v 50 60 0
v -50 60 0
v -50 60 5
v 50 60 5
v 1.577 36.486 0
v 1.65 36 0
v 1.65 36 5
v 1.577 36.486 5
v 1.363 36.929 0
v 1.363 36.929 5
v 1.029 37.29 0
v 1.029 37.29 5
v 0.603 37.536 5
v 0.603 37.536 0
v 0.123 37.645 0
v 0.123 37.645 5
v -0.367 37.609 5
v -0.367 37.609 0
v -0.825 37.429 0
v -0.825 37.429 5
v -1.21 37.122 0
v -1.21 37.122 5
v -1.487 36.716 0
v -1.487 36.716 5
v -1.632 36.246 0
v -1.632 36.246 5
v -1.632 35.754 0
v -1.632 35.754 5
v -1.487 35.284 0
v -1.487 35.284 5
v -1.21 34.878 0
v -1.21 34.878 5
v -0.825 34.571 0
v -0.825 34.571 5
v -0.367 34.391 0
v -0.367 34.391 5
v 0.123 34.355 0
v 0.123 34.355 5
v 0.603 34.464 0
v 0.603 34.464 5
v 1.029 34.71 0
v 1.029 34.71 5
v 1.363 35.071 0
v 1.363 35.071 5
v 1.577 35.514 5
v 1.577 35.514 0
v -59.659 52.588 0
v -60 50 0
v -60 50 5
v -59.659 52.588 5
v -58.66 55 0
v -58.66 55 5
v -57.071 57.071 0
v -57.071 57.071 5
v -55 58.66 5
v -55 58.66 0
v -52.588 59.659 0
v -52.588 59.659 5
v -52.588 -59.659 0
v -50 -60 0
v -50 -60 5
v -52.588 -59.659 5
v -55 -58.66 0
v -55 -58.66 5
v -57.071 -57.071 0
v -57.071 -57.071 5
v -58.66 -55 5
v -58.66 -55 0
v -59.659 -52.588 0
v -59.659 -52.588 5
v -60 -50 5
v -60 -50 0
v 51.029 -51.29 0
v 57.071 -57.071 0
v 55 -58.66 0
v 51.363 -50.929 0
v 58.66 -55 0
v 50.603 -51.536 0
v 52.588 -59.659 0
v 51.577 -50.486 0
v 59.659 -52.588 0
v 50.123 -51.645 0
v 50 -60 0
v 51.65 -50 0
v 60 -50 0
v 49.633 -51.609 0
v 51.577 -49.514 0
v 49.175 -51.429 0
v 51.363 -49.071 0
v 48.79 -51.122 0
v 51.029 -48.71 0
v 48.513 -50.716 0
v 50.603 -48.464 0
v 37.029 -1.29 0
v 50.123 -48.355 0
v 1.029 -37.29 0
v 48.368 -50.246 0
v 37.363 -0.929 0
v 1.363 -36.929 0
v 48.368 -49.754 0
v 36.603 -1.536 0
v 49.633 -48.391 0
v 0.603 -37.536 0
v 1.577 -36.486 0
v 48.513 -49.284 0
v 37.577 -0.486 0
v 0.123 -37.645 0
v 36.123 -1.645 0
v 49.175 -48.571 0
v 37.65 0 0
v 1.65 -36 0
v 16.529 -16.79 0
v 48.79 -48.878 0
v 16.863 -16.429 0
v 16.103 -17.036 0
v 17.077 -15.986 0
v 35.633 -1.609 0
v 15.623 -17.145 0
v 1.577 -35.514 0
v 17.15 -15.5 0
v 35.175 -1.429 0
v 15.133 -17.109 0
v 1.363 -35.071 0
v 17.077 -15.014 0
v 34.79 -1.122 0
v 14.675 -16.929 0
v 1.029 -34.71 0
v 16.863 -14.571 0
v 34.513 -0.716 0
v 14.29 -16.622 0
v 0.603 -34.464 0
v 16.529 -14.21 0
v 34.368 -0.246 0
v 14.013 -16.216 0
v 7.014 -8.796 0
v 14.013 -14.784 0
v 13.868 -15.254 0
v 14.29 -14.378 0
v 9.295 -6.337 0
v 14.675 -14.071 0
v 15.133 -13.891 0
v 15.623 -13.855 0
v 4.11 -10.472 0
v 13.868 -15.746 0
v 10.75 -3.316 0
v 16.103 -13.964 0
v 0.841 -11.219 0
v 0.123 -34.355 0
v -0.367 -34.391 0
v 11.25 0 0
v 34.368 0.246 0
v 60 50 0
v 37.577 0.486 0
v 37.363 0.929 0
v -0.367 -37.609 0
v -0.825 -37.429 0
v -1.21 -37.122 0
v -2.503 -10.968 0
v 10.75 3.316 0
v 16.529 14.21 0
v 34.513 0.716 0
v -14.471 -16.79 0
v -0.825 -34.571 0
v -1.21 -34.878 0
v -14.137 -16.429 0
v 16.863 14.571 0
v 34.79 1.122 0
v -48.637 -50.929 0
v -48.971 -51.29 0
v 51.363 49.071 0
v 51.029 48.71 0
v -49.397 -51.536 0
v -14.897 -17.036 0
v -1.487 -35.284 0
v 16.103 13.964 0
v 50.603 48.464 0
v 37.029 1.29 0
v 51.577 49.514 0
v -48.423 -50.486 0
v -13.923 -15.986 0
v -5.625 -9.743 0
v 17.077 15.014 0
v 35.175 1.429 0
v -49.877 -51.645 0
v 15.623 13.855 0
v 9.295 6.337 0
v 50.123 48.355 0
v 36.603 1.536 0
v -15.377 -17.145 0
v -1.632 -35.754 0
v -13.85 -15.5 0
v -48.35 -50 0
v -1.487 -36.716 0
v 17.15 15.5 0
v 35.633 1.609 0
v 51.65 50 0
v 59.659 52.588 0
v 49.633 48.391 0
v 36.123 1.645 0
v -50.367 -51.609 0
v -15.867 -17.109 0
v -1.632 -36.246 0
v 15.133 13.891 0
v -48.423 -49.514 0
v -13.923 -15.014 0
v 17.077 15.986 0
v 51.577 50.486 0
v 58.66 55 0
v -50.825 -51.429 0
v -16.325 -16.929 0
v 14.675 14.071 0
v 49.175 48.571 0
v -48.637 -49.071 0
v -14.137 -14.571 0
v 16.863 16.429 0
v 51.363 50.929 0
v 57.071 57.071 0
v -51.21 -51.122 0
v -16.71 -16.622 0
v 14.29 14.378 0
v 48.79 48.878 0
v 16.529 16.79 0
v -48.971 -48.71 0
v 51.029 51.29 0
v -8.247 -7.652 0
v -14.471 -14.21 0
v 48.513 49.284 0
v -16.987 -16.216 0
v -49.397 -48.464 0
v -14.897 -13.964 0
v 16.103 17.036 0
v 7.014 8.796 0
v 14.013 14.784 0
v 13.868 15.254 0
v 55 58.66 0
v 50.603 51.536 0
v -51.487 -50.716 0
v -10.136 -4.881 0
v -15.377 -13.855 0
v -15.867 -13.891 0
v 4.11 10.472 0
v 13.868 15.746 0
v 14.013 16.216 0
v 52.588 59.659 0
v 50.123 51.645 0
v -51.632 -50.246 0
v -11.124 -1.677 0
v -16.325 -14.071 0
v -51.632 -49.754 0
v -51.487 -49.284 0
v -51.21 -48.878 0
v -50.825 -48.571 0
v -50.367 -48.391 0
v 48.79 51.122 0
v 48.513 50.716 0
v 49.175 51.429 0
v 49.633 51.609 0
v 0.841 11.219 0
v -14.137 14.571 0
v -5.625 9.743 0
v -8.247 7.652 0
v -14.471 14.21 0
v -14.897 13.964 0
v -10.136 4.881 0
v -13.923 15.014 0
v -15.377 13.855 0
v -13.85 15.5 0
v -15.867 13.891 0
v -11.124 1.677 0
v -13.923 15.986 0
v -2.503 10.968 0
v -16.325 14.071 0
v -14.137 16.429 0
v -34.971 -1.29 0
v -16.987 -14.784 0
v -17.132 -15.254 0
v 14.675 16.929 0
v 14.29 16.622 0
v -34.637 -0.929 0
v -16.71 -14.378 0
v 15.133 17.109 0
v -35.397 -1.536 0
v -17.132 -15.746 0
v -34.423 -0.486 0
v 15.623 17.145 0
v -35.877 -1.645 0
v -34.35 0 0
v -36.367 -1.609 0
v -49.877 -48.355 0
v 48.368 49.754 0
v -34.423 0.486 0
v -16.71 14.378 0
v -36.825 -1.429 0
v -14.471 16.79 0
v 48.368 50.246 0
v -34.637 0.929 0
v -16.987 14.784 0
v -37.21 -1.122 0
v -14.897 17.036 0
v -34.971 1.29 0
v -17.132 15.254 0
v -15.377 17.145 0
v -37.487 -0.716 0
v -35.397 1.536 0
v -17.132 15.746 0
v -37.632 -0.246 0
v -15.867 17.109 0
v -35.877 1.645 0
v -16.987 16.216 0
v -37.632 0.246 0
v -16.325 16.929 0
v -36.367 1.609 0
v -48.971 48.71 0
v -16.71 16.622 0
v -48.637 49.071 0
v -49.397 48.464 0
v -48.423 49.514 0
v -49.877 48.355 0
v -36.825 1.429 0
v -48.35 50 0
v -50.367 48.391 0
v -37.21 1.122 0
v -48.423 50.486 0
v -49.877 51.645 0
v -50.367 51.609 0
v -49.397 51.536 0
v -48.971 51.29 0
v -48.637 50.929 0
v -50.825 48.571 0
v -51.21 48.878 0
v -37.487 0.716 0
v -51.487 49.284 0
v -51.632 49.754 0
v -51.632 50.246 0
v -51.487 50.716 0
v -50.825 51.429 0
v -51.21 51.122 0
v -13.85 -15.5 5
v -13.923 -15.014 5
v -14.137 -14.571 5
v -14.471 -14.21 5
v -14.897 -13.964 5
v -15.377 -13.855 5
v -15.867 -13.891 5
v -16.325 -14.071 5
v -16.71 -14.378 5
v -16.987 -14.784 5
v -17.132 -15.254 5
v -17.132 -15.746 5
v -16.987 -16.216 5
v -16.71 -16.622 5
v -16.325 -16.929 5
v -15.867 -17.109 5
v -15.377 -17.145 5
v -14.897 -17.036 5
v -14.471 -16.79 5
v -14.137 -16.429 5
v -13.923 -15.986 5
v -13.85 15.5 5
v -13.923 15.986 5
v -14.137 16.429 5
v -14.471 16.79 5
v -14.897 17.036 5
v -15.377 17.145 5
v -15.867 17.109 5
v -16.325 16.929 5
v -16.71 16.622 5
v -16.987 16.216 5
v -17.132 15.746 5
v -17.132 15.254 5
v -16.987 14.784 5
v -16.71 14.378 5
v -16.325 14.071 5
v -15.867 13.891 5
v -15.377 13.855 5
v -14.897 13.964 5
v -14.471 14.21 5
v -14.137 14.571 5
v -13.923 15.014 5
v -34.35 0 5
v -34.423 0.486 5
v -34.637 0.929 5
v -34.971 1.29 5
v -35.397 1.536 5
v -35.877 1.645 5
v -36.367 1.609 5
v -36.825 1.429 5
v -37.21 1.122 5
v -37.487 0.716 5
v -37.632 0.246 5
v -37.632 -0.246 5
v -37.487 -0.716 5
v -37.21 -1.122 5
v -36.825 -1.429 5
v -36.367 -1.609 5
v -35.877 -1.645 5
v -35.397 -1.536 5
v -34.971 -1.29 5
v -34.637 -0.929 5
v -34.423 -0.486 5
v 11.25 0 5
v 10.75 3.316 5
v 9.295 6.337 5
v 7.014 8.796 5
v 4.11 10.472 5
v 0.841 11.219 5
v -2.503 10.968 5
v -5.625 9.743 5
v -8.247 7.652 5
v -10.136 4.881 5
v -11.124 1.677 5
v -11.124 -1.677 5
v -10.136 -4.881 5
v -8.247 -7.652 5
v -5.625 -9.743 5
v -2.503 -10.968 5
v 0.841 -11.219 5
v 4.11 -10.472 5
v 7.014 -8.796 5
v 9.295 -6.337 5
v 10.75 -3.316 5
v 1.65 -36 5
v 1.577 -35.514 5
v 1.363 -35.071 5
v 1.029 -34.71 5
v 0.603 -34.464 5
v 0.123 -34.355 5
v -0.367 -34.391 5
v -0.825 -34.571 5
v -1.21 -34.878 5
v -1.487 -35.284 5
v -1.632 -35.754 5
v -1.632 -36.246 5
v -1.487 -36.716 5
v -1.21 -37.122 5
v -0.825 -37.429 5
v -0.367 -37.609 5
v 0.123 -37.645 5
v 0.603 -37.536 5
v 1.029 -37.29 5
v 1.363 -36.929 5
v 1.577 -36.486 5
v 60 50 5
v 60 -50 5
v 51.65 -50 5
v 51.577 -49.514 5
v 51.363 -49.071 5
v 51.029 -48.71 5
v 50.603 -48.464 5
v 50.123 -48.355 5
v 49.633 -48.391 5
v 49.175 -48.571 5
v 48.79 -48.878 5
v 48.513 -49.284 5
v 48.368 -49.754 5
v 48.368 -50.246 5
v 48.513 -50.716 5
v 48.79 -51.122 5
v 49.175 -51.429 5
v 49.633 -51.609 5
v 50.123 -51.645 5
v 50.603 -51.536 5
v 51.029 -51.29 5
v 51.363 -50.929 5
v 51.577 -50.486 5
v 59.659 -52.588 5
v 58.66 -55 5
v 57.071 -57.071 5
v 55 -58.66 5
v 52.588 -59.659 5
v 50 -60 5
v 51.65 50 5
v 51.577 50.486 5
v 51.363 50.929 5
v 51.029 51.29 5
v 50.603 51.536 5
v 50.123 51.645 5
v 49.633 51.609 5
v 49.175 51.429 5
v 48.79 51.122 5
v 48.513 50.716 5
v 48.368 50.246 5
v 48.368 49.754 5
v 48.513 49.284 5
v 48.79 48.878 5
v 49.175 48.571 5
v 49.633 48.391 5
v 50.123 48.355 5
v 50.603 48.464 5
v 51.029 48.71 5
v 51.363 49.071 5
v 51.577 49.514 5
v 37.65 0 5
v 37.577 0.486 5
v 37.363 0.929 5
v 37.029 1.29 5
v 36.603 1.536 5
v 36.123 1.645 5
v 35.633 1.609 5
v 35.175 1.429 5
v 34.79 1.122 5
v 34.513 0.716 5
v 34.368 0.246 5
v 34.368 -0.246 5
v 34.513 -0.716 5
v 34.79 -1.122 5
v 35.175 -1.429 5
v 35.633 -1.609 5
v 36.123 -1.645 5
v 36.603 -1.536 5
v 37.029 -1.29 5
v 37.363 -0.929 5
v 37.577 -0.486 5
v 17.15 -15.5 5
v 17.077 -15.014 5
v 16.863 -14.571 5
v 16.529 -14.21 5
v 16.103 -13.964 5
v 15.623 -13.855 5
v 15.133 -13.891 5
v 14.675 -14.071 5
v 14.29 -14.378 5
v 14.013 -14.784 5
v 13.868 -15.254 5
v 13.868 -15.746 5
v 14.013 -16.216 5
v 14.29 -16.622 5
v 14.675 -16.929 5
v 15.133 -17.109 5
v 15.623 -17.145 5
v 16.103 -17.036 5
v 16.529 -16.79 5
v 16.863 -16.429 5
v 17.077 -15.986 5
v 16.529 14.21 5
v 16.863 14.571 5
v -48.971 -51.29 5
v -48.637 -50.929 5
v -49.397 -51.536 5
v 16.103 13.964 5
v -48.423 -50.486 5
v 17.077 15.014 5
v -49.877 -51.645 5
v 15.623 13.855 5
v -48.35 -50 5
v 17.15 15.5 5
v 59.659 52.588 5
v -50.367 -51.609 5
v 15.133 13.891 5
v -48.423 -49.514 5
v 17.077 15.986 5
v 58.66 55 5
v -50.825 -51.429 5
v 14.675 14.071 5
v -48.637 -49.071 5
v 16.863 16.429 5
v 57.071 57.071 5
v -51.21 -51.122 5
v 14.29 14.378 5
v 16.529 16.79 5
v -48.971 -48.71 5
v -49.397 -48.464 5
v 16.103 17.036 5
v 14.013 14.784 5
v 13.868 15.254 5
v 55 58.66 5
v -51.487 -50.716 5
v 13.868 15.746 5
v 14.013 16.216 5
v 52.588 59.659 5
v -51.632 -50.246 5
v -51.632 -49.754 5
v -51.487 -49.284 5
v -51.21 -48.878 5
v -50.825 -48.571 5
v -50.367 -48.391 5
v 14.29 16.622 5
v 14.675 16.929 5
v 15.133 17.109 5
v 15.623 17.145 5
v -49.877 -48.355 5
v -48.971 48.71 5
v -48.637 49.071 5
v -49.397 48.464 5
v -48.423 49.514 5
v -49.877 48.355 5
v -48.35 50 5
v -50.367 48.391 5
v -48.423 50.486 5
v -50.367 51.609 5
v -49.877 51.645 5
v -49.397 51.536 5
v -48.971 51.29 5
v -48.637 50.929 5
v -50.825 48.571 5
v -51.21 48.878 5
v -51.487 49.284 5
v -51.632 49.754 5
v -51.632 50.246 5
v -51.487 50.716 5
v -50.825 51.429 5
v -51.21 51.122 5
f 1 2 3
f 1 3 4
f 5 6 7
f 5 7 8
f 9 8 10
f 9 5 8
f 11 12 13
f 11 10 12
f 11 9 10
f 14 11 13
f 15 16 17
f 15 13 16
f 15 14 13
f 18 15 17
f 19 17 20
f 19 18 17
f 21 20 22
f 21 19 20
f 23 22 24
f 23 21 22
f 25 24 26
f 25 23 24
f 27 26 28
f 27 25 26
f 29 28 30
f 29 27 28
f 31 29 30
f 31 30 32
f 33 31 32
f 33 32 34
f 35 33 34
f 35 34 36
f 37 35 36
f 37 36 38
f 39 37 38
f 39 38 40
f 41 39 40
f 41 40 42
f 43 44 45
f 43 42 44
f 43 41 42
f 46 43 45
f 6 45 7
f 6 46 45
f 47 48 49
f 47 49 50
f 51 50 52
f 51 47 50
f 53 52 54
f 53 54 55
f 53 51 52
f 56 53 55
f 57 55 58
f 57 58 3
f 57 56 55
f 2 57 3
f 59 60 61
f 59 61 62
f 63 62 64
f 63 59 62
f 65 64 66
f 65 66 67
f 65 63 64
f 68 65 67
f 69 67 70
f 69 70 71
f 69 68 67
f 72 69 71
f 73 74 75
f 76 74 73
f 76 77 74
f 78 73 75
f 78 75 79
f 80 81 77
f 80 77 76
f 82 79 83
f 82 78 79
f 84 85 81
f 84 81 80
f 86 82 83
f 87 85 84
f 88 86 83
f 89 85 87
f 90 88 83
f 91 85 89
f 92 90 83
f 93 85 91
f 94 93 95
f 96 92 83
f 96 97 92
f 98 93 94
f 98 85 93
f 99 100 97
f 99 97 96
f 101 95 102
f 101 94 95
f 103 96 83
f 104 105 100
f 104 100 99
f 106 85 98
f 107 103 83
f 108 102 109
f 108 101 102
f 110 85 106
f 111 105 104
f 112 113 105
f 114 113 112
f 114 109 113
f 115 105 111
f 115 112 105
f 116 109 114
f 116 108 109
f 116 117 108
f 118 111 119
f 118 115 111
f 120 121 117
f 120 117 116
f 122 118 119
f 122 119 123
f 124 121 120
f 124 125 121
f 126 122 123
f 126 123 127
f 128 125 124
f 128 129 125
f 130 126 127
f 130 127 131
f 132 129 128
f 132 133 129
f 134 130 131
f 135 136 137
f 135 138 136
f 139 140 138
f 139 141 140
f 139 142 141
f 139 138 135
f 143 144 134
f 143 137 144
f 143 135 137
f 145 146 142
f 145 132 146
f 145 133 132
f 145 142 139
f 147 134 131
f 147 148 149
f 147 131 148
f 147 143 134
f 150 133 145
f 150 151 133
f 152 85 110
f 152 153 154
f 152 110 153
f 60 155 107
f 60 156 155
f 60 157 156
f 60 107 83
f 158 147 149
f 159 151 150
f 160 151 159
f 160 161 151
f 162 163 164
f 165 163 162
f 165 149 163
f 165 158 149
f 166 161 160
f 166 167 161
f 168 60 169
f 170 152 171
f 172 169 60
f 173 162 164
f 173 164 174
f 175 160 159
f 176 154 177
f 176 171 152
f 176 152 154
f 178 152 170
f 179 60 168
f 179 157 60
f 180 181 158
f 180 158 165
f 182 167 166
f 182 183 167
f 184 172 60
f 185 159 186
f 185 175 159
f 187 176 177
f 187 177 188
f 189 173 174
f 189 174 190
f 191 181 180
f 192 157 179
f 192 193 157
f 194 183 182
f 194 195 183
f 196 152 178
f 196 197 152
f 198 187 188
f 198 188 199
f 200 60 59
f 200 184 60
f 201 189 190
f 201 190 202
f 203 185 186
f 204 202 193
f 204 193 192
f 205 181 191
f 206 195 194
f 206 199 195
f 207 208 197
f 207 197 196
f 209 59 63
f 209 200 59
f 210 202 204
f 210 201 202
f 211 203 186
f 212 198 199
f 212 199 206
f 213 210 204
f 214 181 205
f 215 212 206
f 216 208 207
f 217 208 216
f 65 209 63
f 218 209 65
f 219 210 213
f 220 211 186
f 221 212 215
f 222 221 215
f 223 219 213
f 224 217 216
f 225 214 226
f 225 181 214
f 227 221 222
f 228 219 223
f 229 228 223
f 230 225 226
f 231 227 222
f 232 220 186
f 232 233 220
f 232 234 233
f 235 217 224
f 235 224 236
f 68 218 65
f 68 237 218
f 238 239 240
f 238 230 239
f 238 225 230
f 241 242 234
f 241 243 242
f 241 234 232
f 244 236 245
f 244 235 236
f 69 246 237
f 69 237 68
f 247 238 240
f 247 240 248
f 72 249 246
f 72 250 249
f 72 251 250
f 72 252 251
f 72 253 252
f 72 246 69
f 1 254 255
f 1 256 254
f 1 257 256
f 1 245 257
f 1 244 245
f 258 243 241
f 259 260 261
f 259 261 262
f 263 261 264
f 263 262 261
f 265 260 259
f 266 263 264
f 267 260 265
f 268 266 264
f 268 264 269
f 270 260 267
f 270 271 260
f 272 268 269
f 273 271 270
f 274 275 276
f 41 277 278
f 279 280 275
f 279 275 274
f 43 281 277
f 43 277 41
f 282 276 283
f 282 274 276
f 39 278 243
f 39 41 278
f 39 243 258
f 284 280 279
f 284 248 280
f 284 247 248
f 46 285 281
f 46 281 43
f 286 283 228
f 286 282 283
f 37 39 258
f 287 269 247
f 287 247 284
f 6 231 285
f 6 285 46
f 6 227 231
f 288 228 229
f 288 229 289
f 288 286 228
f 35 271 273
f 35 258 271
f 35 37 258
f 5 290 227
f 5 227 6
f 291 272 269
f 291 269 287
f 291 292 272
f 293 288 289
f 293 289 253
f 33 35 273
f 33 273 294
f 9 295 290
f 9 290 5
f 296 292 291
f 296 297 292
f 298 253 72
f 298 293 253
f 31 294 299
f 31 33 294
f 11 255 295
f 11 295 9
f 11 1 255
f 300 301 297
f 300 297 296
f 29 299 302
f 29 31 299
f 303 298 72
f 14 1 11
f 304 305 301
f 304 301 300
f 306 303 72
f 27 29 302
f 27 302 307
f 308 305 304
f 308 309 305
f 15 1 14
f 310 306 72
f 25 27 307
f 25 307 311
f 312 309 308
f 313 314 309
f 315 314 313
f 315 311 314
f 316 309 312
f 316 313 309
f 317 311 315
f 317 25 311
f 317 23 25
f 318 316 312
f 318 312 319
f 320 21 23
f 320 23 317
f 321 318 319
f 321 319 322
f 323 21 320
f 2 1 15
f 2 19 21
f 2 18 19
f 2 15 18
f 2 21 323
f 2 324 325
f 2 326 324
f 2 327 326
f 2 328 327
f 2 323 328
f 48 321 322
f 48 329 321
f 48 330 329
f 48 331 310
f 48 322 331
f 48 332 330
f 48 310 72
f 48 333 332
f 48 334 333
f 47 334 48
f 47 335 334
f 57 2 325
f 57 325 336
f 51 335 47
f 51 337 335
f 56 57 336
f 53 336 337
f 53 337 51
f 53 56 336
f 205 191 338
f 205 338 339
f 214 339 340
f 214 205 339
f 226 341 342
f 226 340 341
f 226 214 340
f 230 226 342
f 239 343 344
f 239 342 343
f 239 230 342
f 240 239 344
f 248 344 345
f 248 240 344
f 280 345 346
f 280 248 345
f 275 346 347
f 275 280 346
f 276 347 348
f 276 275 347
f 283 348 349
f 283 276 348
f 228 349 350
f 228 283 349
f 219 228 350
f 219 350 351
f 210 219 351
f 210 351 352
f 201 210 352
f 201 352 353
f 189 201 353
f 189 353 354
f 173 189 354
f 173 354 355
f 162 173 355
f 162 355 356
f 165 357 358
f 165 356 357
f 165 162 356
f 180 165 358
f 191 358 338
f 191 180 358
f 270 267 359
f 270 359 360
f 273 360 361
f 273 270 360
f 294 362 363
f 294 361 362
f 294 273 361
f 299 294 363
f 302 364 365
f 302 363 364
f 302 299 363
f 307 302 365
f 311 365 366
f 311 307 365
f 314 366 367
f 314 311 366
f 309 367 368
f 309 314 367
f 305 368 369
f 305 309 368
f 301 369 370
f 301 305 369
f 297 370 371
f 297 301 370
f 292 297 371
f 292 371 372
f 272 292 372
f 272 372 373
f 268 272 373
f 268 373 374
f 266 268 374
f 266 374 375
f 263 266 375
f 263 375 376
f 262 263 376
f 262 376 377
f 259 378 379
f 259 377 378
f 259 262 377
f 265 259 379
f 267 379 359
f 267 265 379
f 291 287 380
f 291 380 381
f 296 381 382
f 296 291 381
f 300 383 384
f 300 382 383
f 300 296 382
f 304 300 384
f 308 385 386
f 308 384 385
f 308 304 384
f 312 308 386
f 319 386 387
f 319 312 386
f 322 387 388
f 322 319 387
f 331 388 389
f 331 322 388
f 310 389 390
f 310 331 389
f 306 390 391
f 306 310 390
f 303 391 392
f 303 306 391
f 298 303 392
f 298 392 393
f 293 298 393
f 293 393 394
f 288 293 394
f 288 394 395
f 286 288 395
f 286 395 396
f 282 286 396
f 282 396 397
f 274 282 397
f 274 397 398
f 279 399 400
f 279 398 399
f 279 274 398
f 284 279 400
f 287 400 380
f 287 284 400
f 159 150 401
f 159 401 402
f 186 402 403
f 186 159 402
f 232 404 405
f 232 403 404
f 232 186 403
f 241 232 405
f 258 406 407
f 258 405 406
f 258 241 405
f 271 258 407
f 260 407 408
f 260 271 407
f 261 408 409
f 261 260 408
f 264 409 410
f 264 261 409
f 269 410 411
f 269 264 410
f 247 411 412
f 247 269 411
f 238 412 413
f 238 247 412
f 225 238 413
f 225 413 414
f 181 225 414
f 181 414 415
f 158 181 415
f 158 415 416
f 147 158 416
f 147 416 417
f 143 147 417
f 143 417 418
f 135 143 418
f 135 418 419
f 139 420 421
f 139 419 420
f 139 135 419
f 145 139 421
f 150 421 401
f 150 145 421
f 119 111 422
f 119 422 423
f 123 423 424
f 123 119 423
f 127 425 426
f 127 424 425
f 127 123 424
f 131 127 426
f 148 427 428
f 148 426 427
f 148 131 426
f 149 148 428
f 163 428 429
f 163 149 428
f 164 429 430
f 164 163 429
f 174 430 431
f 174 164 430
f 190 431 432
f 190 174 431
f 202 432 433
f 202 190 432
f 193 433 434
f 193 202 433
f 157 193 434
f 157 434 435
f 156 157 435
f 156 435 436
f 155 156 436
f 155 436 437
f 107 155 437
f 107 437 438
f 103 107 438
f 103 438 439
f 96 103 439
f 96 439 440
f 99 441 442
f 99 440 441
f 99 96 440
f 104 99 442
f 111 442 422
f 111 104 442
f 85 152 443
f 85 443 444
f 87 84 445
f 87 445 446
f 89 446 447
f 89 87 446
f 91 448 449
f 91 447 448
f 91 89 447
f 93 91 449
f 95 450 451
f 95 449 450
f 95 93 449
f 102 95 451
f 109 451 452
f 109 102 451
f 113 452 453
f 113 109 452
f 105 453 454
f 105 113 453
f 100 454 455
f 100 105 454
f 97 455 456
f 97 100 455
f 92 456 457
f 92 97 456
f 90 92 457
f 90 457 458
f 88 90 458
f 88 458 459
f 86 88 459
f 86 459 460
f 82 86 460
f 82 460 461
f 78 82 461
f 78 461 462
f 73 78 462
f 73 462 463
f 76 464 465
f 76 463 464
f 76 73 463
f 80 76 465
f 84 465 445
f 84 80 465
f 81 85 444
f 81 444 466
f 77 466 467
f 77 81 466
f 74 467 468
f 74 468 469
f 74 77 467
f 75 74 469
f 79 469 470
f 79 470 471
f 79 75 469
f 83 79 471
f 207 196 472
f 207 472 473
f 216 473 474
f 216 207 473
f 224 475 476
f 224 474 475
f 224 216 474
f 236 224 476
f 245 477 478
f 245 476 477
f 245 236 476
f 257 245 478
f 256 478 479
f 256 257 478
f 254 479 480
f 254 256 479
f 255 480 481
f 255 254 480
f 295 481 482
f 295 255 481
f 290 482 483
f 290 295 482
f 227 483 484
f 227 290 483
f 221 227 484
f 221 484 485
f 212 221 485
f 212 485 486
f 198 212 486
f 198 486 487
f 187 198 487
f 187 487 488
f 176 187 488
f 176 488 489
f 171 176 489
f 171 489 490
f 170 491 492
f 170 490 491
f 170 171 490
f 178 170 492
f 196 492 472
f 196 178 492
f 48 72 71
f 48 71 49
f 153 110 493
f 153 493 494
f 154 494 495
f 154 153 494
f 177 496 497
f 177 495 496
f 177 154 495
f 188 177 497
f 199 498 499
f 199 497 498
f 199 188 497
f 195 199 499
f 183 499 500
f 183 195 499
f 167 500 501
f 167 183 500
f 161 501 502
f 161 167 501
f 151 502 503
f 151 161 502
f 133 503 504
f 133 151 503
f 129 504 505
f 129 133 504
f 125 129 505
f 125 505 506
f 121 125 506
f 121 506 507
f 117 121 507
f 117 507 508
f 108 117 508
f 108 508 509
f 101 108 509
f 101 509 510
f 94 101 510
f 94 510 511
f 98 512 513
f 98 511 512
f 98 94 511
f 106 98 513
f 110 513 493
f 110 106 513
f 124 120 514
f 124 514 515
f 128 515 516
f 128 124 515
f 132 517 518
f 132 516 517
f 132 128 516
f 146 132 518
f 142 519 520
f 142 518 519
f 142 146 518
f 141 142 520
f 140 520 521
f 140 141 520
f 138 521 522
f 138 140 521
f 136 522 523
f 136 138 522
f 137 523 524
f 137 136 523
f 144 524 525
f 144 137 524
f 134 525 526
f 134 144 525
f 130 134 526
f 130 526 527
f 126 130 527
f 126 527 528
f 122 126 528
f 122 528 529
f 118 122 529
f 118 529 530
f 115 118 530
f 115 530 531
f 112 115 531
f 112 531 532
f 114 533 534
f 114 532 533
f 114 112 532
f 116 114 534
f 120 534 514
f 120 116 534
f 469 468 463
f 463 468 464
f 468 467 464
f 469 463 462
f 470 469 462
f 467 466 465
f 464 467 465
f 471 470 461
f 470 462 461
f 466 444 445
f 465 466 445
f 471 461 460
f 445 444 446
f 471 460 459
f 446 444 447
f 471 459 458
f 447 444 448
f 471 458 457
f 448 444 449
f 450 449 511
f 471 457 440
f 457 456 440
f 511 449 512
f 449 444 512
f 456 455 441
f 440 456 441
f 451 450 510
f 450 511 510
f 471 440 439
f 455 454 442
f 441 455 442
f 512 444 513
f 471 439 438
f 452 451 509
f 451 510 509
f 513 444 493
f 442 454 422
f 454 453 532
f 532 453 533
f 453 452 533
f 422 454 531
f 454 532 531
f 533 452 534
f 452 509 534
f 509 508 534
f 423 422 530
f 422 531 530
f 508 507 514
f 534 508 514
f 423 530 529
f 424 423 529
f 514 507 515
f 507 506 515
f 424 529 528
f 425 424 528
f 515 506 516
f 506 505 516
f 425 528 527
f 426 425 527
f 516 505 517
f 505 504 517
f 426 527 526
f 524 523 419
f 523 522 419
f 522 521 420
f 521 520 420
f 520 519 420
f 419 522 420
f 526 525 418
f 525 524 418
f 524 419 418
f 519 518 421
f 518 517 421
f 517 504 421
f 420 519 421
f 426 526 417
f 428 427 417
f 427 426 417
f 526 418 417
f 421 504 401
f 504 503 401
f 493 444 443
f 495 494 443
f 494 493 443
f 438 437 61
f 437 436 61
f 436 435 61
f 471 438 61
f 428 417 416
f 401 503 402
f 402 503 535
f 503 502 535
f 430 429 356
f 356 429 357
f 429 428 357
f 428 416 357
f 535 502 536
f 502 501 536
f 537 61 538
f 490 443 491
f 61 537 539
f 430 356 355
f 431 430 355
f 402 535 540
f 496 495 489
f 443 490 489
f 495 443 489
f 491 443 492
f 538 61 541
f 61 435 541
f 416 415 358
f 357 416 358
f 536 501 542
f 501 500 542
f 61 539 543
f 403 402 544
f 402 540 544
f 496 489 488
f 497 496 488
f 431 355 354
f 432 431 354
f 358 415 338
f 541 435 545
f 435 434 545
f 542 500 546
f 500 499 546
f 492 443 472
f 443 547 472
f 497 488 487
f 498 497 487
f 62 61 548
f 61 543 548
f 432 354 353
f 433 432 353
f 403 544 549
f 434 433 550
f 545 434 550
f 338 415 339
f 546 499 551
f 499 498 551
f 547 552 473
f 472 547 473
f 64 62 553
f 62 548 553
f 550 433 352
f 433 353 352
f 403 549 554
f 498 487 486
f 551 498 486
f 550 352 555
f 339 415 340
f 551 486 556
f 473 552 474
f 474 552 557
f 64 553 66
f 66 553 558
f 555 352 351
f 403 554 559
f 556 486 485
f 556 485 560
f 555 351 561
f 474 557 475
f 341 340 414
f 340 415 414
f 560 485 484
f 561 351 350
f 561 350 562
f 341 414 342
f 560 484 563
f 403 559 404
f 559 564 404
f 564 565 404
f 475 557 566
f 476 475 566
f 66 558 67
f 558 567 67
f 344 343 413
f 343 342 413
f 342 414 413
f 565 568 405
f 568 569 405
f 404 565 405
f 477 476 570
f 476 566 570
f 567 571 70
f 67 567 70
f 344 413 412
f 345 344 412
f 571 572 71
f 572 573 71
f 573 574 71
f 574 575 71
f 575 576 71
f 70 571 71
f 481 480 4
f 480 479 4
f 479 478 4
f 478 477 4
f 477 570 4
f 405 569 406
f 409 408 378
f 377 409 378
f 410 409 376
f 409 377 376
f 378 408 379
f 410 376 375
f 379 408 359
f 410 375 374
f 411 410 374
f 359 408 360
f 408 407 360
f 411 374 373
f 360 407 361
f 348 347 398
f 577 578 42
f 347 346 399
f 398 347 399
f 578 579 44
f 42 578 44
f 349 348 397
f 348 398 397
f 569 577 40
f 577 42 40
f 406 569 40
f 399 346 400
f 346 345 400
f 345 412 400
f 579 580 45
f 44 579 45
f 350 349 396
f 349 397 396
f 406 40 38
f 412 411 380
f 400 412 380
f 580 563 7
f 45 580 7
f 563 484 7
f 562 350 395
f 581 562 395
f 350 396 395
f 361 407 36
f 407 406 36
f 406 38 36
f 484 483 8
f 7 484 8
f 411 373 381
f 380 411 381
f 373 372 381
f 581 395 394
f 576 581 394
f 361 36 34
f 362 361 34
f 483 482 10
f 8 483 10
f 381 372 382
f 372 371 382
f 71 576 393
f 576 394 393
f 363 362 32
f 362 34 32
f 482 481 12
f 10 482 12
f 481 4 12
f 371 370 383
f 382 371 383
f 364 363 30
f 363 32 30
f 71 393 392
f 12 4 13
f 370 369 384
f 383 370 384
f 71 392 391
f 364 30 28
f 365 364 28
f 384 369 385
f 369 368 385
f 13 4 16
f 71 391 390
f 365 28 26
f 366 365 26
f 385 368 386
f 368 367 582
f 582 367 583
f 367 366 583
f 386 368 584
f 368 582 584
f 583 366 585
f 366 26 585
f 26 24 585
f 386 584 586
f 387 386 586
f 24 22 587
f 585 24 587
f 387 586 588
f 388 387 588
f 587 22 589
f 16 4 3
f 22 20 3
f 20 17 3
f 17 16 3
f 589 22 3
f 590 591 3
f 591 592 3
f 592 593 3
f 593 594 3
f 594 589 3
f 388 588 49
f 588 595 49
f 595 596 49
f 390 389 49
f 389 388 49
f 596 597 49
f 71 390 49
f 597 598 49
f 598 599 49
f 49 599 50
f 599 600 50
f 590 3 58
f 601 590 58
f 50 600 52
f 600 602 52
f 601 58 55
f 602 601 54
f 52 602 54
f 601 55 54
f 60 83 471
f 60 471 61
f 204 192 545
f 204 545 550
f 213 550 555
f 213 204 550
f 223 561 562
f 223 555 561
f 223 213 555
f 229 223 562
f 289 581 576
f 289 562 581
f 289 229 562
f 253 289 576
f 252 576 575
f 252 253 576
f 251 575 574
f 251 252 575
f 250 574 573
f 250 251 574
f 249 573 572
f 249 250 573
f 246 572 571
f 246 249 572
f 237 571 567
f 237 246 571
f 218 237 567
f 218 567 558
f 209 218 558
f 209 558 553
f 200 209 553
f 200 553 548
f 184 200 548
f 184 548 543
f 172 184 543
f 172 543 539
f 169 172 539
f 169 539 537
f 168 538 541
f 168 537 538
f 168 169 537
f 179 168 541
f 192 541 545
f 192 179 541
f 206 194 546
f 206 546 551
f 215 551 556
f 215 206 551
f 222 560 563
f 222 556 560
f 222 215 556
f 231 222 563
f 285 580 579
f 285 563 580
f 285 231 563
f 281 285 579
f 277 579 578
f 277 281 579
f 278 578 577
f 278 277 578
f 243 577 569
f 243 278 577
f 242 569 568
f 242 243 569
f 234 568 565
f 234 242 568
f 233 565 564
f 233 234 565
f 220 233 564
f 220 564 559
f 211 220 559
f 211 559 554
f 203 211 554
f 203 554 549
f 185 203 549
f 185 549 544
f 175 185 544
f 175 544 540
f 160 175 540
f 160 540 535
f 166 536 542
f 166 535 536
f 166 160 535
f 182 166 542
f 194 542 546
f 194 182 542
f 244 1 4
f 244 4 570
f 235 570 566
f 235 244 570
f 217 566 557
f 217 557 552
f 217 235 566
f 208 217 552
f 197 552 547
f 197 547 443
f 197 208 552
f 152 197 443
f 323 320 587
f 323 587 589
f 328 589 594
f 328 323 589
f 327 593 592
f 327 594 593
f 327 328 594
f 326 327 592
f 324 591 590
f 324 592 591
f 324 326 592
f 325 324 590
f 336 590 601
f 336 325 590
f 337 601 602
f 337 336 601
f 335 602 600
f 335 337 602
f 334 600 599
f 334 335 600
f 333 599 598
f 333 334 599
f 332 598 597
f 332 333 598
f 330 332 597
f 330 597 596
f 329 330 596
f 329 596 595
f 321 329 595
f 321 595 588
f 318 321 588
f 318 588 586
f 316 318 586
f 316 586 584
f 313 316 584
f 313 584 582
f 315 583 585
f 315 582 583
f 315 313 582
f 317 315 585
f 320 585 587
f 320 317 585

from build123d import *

# Parameters (mm, degrees)
PLASTINA_DEPTH        = 5
OTVERSTIYA_DEPTH      = 86
OTVERSTIYA_DEPTH_BACK = 86
ESKIZ_OTVERSTIYA_R    = 1.65
ESKIZ_OTVERSTIYA_R_2  = 11.25


with BuildPart() as part:
    # Eskiz_kontur → Plastina (new body)
    with BuildSketch(Plane.XY):
        with BuildLine():
            Line((-60, -50), (-60, 50))
            ThreePointArc((-60, 50), (-57.071067812, 57.071067812), (-50, 60))
            Line((-50, 60), (50, 60))
            ThreePointArc((50, 60), (57.071067812, 57.071067812), (60, 50))
            Line((60, 50), (60, -50))
            ThreePointArc((60, -50), (57.071067812, -57.071067812), (50, -60))
            Line((50, -60), (-50, -60))
            ThreePointArc((-50, -60), (-57.071067812, -57.071067812), (-60, -50))
        make_face()
    extrude(amount=PLASTINA_DEPTH)

    # Eskiz_otverstiya → Otverstiya (cut, two sides: drawn at the far end of the back side and taken through both)
    with BuildSketch(Plane.XY.offset(-OTVERSTIYA_DEPTH_BACK)):
        with Locations((-50, -50)):
            Circle(ESKIZ_OTVERSTIYA_R)
        with Locations((0, -36)):
            Circle(ESKIZ_OTVERSTIYA_R)
        with Locations((-15.5, -15.5)):
            Circle(ESKIZ_OTVERSTIYA_R)
        Circle(ESKIZ_OTVERSTIYA_R_2)
        with Locations((50, -50)):
            Circle(ESKIZ_OTVERSTIYA_R)
        with Locations((15.5, -15.5)):
            Circle(ESKIZ_OTVERSTIYA_R)
        with Locations((36, 0)):
            Circle(ESKIZ_OTVERSTIYA_R)
        with Locations((-36, 0)):
            Circle(ESKIZ_OTVERSTIYA_R)
        with Locations((-15.5, 15.5)):
            Circle(ESKIZ_OTVERSTIYA_R)
        with Locations((-50, 50)):
            Circle(ESKIZ_OTVERSTIYA_R)
        with Locations((0, 36)):
            Circle(ESKIZ_OTVERSTIYA_R)
        with Locations((15.5, 15.5)):
            Circle(ESKIZ_OTVERSTIYA_R)
        with Locations((50, 50)):
            Circle(ESKIZ_OTVERSTIYA_R)
    extrude(amount=OTVERSTIYA_DEPTH + OTVERSTIYA_DEPTH_BACK, mode=Mode.SUBTRACT)


solid = part.part
